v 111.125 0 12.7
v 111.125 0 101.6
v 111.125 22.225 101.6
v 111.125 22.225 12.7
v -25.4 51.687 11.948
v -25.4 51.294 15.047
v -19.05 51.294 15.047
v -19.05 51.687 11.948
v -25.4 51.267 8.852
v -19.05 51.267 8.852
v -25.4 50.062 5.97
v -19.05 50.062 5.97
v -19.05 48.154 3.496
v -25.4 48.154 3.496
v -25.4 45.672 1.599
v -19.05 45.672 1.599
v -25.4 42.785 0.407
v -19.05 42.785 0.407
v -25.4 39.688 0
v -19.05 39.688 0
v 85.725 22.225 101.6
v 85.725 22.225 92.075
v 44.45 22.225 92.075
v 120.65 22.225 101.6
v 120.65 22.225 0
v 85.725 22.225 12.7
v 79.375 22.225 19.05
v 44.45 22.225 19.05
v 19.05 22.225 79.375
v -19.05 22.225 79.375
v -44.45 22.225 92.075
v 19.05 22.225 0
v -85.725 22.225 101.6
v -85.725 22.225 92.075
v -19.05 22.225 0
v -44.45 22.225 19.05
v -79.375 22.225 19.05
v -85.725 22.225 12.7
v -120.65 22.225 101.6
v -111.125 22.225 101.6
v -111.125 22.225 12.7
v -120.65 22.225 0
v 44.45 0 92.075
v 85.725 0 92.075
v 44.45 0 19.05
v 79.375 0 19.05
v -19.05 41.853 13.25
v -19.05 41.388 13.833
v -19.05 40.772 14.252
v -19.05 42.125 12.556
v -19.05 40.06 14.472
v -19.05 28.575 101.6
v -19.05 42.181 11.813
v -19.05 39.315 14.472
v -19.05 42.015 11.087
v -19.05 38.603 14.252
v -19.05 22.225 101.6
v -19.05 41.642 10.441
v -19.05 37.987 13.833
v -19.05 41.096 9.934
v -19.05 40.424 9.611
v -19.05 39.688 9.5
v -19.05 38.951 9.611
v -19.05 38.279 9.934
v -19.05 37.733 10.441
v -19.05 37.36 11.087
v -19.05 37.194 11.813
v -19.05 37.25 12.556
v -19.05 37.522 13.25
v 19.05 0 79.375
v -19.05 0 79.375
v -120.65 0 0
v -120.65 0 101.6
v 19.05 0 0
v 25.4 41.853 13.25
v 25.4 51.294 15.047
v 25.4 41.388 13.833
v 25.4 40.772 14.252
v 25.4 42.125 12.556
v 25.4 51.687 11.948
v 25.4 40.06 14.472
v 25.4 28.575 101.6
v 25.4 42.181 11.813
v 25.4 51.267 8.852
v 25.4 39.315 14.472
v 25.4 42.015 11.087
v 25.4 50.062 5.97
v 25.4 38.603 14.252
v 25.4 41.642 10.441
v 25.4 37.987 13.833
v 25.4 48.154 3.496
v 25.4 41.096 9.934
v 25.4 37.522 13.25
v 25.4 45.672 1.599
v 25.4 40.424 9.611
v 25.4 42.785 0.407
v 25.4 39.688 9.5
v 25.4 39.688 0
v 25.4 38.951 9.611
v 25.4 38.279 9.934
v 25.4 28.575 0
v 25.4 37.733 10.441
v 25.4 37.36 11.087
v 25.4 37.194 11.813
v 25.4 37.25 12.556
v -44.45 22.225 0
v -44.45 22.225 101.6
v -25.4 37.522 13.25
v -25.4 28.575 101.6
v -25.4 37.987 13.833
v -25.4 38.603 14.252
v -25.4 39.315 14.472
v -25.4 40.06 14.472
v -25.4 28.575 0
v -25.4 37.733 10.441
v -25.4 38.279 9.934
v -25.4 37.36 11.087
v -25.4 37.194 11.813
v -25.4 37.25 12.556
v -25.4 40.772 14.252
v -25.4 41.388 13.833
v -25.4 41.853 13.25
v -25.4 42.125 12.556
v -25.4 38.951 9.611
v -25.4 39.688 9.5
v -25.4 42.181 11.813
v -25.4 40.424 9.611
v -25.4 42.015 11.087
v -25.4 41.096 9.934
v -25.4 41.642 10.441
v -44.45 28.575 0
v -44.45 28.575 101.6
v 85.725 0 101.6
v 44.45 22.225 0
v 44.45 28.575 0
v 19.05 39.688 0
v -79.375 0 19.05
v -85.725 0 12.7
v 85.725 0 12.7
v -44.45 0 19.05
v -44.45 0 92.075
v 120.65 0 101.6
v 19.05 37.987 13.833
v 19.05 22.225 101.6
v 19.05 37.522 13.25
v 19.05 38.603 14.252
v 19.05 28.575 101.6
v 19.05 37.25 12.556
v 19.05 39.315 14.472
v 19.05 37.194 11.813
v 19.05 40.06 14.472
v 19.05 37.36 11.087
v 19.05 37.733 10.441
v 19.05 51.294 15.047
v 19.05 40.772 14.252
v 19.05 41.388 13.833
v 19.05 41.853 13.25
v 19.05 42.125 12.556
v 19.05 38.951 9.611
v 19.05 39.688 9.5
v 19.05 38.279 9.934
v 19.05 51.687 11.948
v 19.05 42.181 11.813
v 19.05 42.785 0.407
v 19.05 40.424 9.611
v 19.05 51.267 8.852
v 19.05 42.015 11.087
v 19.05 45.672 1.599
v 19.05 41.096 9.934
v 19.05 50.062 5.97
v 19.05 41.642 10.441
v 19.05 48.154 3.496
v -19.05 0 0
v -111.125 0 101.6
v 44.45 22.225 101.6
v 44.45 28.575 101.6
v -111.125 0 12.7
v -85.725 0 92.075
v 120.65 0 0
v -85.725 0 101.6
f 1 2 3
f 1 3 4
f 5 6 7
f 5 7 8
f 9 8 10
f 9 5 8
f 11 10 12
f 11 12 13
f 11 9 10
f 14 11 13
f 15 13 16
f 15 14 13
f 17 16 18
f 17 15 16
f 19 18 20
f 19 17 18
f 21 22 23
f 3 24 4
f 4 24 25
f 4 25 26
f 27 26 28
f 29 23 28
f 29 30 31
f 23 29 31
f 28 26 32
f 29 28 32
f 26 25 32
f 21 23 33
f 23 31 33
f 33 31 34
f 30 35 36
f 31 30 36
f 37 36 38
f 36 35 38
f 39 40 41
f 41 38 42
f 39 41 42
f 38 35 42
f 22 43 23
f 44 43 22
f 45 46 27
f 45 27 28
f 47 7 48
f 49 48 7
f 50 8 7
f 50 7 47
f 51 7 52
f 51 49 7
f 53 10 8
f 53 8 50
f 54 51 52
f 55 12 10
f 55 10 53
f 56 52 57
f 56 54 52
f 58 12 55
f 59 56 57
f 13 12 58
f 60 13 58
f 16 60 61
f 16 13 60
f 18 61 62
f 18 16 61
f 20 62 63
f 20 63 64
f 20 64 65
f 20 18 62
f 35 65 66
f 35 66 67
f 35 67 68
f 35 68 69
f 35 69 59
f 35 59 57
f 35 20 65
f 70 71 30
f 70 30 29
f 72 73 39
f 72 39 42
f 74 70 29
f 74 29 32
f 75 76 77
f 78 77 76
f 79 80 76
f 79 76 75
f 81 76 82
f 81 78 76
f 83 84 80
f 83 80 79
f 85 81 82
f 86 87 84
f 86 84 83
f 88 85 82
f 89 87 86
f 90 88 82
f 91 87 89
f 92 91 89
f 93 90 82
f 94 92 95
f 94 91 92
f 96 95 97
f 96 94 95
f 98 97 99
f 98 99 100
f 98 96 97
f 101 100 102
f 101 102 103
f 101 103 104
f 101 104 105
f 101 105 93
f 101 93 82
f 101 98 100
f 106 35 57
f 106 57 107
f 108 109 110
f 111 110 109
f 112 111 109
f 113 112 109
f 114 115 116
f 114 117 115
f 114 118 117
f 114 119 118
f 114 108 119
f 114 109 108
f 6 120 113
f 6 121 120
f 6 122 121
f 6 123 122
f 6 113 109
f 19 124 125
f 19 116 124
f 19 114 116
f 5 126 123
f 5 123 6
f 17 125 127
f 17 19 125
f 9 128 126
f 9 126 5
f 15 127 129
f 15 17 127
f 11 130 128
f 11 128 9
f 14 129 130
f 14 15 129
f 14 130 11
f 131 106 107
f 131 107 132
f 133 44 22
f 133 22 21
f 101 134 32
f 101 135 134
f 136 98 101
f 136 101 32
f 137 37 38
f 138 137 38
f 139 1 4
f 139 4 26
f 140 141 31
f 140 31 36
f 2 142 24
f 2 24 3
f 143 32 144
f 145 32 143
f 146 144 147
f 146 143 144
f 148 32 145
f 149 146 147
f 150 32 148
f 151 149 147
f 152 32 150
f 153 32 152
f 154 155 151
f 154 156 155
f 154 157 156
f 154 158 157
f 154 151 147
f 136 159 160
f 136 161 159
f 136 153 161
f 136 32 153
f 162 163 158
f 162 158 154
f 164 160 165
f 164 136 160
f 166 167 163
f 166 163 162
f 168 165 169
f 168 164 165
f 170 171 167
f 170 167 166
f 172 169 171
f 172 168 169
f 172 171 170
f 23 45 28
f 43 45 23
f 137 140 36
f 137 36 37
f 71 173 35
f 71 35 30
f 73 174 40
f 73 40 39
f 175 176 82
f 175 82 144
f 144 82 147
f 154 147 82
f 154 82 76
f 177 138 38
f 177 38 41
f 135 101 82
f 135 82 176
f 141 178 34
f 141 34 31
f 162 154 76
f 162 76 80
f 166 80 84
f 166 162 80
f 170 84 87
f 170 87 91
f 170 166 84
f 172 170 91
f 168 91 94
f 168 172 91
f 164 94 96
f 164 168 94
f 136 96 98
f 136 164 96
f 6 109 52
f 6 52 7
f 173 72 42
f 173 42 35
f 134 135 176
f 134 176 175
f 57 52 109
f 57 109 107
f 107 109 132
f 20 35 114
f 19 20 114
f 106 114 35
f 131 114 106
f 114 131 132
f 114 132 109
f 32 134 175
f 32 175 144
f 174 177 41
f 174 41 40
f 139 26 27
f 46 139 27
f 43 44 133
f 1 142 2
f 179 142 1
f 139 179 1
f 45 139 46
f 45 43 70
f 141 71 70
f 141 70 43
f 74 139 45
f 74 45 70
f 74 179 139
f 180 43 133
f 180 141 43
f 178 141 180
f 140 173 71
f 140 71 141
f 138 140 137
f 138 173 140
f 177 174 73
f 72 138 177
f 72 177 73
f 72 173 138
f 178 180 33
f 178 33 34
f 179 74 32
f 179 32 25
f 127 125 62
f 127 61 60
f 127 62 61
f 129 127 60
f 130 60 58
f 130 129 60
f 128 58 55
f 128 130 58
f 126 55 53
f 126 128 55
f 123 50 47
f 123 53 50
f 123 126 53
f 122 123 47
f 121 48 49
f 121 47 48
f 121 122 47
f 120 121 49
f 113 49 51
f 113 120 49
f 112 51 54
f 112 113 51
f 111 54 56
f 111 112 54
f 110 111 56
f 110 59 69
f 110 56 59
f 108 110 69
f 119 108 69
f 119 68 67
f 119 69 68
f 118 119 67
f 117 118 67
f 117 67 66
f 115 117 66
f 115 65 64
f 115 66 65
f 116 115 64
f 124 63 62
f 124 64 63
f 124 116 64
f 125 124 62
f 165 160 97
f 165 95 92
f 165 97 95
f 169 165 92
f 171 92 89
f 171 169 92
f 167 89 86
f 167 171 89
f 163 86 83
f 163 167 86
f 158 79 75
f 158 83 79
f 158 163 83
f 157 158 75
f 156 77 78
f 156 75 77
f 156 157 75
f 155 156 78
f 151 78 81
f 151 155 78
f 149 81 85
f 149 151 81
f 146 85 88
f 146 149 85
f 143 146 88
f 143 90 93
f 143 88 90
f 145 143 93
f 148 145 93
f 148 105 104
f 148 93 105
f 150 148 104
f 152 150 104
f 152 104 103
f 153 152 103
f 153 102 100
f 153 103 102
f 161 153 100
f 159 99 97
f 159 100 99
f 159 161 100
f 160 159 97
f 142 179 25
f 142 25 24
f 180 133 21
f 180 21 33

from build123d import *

# Parameters (mm, degrees)
BOSS_EXTRUDE1_DEPTH     = 22.225
BOSS_EXTRUDE2_DEPTH     = 101.6
BOSS_EXTRUDE2_2_DEPTH   = 101.6
CUT_EXTRUDE2_DEPTH      = 174.814939303
CUT_EXTRUDE2_DEPTH_BACK = 174.814939303
SKETCH6_R               = 2.5


with BuildPart() as part:
    # Sketch1 → Boss-Extrude1 (new body)
    with BuildSketch(Plane(origin=(0, 0, 0), x_dir=(1, 0, 0), z_dir=(0, 1, 0))):
        Polygon((-19.05, 0), (-19.05, -79.375), (19.05, -79.375), (19.05, 0), (120.65, 0), (120.65, -101.6), (111.125, -101.6), (111.125, -12.7), (85.725, -12.7), (79.375, -19.05), (44.45, -19.05), (44.45, -92.075), (85.725, -92.075), (85.725, -101.6), (-85.725, -101.6), (-85.725, -92.075), (-44.45, -92.075), (-44.45, -19.05), (-79.375, -19.05), (-85.725, -12.7), (-111.125, -12.7), (-111.125, -101.6), (-120.65, -101.6), (-120.65, 0), align=None)
    extrude(amount=BOSS_EXTRUDE1_DEPTH)


with BuildPart() as body_2:
    # Sketch5 → Boss-Extrude2 (new body)
    with BuildSketch(Plane(origin=(0, 0, 0), x_dir=(-1, 0, 0), z_dir=(0, 0, -1))):
        Polygon((-19.05, 22.225), (-19.05, 73.025), (-25.4, 73.025), (-25.4, 28.575), (-44.45, 28.575), (-44.45, 22.225), align=None)
    extrude(amount=-BOSS_EXTRUDE2_DEPTH)


with BuildPart() as body_3:
    # Sketch5 → Boss-Extrude2 2 (new body)
    with BuildSketch(Plane(origin=(0, 0, 0), x_dir=(-1, 0, 0), z_dir=(0, 0, -1))):
        Polygon((19.05, 22.225), (44.45, 22.225), (44.45, 28.575), (25.4, 28.575), (25.4, 73.025), (19.05, 73.025), align=None)
    extrude(amount=-BOSS_EXTRUDE2_2_DEPTH)


with BuildPart() as cut_extrude2_tool:
    # Sketch6 → Cut-Extrude2 (new, two sides: drawn at the far end of the back side and taken through both)
    with BuildSketch(Plane(origin=(0, 0, 0), x_dir=(0, 0, -1), z_dir=(1, 0, 0)).offset(-CUT_EXTRUDE2_DEPTH_BACK)):
        with Locations((-12, 39.6875)):
            Circle(SKETCH6_R)
        with BuildLine():
            Line((-101.6, 28.575), (-15.046658445, 51.294302847))
            ThreePointArc((-15.046658445, 51.294302847), (-4.670603754, 49.18907622), (0, 39.6875))
            Line((0, 39.6875), (13.396448298, 39.6875))
            Line((13.396448298, 39.6875), (13.396448298, 119.690171167))
            Line((13.396448298, 119.690171167), (-183.880058166, 119.690171167))
            Line((-183.880058166, 119.690171167), (-101.6, 28.575))
        make_face()
    extrude(amount=CUT_EXTRUDE2_DEPTH + CUT_EXTRUDE2_DEPTH_BACK)


with BuildPart() as body_2_1:
    add(body_2.part)

    # Cut-Extrude2: cut by cut_extrude2_tool
    add(cut_extrude2_tool.part, mode=Mode.SUBTRACT)


with BuildPart() as body_3_1:
    add(body_3.part)

    # Cut-Extrude2: cut by cut_extrude2_tool
    add(cut_extrude2_tool.part, mode=Mode.SUBTRACT)


solid = Compound([part.part, body_2_1.part, body_3_1.part])
